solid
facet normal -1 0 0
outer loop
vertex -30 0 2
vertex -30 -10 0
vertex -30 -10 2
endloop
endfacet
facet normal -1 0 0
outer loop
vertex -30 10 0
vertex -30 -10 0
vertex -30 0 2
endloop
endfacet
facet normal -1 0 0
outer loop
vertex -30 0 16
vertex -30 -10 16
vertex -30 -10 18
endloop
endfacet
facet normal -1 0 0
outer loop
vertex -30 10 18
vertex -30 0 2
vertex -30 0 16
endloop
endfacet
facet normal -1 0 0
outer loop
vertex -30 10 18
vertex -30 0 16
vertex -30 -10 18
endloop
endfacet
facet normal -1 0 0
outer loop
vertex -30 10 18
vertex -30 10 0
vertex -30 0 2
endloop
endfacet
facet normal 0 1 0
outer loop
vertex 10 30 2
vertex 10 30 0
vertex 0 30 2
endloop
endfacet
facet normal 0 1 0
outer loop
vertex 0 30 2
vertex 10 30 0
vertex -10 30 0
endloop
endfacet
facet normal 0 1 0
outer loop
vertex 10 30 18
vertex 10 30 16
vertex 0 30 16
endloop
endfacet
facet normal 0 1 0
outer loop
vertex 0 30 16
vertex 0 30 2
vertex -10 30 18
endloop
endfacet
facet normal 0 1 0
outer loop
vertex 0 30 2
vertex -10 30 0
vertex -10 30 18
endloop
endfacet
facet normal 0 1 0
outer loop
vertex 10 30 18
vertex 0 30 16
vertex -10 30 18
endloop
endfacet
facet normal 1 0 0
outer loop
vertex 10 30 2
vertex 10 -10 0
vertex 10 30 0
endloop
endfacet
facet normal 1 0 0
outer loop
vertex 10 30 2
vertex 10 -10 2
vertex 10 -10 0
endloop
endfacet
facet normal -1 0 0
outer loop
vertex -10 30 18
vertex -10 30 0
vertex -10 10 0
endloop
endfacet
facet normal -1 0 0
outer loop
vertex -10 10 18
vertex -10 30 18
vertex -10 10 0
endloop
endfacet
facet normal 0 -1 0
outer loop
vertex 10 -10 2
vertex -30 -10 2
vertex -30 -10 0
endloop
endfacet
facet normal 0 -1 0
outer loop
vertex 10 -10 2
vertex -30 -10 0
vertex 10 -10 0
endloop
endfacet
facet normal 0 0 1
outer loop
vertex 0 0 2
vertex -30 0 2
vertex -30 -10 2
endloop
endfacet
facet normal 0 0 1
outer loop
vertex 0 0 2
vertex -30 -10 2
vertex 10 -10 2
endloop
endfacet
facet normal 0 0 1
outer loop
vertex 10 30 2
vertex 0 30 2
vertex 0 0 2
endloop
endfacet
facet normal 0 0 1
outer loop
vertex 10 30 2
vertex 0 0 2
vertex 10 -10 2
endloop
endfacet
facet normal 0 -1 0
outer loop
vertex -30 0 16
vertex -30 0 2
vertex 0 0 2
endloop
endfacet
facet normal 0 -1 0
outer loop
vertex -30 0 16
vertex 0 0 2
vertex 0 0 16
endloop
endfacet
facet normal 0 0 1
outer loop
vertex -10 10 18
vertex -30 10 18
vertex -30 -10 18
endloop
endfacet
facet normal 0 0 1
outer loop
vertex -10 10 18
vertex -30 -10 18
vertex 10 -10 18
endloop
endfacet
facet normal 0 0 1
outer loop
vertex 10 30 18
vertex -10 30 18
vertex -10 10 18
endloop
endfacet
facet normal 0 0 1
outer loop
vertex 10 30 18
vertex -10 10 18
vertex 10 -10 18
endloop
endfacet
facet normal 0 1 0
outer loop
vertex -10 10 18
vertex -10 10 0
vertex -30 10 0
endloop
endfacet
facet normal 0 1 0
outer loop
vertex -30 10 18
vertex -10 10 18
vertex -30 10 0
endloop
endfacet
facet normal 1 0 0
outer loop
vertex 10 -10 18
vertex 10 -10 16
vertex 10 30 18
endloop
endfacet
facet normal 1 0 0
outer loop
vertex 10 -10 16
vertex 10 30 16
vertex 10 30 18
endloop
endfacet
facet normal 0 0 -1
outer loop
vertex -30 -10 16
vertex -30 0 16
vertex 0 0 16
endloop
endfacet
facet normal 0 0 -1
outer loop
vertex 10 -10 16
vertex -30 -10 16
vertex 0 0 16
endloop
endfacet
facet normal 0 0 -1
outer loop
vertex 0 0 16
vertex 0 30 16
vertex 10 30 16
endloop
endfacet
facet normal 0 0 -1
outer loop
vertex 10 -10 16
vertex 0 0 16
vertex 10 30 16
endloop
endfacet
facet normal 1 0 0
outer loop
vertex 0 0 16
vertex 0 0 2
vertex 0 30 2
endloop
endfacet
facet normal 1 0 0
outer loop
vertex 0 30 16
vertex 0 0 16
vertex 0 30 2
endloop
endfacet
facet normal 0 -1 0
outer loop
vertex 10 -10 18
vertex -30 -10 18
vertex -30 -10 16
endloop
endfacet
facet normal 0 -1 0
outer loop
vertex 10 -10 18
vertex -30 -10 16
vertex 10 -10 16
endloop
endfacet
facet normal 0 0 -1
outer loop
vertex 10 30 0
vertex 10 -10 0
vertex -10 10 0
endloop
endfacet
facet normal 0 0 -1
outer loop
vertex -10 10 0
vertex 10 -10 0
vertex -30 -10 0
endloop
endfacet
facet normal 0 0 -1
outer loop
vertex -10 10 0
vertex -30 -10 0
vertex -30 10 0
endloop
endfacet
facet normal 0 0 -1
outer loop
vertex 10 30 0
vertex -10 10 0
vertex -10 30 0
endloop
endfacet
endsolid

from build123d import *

# Parameters (mm, degrees)
F1_DEPTH = 18
F2_W     = 30
F2_H     = 2
F3_DEPTH = 10
F4_W     = 40
F4_H     = 2
F5_DEPTH = 10


with BuildPart() as f1:
    # F0 (on Top) → F1 (new body)
    with BuildSketch(Plane.XY):
        Polygon((0, 30), (-10, 30), (-10, 10), (-30, 10), (-30, 0), (0, 0), align=None)
    extrude(amount=F1_DEPTH)

    # F2 (on face) → F3 (join)
    with BuildSketch(Plane.YZ):
        with Locations((15, 1)):
            Rectangle(F2_W, F2_H)
        with Locations((15, 17)):
            Rectangle(F2_W, F2_H)
    extrude(amount=F3_DEPTH)

    # F4 (on face) → F5 (join)
    with BuildSketch(Plane.XZ):
        with Locations((-10, 17)):
            Rectangle(F4_W, F4_H)
        with Locations((-10, 1)):
            Rectangle(F4_W, F4_H)
    extrude(amount=F5_DEPTH)


solid = f1.part
